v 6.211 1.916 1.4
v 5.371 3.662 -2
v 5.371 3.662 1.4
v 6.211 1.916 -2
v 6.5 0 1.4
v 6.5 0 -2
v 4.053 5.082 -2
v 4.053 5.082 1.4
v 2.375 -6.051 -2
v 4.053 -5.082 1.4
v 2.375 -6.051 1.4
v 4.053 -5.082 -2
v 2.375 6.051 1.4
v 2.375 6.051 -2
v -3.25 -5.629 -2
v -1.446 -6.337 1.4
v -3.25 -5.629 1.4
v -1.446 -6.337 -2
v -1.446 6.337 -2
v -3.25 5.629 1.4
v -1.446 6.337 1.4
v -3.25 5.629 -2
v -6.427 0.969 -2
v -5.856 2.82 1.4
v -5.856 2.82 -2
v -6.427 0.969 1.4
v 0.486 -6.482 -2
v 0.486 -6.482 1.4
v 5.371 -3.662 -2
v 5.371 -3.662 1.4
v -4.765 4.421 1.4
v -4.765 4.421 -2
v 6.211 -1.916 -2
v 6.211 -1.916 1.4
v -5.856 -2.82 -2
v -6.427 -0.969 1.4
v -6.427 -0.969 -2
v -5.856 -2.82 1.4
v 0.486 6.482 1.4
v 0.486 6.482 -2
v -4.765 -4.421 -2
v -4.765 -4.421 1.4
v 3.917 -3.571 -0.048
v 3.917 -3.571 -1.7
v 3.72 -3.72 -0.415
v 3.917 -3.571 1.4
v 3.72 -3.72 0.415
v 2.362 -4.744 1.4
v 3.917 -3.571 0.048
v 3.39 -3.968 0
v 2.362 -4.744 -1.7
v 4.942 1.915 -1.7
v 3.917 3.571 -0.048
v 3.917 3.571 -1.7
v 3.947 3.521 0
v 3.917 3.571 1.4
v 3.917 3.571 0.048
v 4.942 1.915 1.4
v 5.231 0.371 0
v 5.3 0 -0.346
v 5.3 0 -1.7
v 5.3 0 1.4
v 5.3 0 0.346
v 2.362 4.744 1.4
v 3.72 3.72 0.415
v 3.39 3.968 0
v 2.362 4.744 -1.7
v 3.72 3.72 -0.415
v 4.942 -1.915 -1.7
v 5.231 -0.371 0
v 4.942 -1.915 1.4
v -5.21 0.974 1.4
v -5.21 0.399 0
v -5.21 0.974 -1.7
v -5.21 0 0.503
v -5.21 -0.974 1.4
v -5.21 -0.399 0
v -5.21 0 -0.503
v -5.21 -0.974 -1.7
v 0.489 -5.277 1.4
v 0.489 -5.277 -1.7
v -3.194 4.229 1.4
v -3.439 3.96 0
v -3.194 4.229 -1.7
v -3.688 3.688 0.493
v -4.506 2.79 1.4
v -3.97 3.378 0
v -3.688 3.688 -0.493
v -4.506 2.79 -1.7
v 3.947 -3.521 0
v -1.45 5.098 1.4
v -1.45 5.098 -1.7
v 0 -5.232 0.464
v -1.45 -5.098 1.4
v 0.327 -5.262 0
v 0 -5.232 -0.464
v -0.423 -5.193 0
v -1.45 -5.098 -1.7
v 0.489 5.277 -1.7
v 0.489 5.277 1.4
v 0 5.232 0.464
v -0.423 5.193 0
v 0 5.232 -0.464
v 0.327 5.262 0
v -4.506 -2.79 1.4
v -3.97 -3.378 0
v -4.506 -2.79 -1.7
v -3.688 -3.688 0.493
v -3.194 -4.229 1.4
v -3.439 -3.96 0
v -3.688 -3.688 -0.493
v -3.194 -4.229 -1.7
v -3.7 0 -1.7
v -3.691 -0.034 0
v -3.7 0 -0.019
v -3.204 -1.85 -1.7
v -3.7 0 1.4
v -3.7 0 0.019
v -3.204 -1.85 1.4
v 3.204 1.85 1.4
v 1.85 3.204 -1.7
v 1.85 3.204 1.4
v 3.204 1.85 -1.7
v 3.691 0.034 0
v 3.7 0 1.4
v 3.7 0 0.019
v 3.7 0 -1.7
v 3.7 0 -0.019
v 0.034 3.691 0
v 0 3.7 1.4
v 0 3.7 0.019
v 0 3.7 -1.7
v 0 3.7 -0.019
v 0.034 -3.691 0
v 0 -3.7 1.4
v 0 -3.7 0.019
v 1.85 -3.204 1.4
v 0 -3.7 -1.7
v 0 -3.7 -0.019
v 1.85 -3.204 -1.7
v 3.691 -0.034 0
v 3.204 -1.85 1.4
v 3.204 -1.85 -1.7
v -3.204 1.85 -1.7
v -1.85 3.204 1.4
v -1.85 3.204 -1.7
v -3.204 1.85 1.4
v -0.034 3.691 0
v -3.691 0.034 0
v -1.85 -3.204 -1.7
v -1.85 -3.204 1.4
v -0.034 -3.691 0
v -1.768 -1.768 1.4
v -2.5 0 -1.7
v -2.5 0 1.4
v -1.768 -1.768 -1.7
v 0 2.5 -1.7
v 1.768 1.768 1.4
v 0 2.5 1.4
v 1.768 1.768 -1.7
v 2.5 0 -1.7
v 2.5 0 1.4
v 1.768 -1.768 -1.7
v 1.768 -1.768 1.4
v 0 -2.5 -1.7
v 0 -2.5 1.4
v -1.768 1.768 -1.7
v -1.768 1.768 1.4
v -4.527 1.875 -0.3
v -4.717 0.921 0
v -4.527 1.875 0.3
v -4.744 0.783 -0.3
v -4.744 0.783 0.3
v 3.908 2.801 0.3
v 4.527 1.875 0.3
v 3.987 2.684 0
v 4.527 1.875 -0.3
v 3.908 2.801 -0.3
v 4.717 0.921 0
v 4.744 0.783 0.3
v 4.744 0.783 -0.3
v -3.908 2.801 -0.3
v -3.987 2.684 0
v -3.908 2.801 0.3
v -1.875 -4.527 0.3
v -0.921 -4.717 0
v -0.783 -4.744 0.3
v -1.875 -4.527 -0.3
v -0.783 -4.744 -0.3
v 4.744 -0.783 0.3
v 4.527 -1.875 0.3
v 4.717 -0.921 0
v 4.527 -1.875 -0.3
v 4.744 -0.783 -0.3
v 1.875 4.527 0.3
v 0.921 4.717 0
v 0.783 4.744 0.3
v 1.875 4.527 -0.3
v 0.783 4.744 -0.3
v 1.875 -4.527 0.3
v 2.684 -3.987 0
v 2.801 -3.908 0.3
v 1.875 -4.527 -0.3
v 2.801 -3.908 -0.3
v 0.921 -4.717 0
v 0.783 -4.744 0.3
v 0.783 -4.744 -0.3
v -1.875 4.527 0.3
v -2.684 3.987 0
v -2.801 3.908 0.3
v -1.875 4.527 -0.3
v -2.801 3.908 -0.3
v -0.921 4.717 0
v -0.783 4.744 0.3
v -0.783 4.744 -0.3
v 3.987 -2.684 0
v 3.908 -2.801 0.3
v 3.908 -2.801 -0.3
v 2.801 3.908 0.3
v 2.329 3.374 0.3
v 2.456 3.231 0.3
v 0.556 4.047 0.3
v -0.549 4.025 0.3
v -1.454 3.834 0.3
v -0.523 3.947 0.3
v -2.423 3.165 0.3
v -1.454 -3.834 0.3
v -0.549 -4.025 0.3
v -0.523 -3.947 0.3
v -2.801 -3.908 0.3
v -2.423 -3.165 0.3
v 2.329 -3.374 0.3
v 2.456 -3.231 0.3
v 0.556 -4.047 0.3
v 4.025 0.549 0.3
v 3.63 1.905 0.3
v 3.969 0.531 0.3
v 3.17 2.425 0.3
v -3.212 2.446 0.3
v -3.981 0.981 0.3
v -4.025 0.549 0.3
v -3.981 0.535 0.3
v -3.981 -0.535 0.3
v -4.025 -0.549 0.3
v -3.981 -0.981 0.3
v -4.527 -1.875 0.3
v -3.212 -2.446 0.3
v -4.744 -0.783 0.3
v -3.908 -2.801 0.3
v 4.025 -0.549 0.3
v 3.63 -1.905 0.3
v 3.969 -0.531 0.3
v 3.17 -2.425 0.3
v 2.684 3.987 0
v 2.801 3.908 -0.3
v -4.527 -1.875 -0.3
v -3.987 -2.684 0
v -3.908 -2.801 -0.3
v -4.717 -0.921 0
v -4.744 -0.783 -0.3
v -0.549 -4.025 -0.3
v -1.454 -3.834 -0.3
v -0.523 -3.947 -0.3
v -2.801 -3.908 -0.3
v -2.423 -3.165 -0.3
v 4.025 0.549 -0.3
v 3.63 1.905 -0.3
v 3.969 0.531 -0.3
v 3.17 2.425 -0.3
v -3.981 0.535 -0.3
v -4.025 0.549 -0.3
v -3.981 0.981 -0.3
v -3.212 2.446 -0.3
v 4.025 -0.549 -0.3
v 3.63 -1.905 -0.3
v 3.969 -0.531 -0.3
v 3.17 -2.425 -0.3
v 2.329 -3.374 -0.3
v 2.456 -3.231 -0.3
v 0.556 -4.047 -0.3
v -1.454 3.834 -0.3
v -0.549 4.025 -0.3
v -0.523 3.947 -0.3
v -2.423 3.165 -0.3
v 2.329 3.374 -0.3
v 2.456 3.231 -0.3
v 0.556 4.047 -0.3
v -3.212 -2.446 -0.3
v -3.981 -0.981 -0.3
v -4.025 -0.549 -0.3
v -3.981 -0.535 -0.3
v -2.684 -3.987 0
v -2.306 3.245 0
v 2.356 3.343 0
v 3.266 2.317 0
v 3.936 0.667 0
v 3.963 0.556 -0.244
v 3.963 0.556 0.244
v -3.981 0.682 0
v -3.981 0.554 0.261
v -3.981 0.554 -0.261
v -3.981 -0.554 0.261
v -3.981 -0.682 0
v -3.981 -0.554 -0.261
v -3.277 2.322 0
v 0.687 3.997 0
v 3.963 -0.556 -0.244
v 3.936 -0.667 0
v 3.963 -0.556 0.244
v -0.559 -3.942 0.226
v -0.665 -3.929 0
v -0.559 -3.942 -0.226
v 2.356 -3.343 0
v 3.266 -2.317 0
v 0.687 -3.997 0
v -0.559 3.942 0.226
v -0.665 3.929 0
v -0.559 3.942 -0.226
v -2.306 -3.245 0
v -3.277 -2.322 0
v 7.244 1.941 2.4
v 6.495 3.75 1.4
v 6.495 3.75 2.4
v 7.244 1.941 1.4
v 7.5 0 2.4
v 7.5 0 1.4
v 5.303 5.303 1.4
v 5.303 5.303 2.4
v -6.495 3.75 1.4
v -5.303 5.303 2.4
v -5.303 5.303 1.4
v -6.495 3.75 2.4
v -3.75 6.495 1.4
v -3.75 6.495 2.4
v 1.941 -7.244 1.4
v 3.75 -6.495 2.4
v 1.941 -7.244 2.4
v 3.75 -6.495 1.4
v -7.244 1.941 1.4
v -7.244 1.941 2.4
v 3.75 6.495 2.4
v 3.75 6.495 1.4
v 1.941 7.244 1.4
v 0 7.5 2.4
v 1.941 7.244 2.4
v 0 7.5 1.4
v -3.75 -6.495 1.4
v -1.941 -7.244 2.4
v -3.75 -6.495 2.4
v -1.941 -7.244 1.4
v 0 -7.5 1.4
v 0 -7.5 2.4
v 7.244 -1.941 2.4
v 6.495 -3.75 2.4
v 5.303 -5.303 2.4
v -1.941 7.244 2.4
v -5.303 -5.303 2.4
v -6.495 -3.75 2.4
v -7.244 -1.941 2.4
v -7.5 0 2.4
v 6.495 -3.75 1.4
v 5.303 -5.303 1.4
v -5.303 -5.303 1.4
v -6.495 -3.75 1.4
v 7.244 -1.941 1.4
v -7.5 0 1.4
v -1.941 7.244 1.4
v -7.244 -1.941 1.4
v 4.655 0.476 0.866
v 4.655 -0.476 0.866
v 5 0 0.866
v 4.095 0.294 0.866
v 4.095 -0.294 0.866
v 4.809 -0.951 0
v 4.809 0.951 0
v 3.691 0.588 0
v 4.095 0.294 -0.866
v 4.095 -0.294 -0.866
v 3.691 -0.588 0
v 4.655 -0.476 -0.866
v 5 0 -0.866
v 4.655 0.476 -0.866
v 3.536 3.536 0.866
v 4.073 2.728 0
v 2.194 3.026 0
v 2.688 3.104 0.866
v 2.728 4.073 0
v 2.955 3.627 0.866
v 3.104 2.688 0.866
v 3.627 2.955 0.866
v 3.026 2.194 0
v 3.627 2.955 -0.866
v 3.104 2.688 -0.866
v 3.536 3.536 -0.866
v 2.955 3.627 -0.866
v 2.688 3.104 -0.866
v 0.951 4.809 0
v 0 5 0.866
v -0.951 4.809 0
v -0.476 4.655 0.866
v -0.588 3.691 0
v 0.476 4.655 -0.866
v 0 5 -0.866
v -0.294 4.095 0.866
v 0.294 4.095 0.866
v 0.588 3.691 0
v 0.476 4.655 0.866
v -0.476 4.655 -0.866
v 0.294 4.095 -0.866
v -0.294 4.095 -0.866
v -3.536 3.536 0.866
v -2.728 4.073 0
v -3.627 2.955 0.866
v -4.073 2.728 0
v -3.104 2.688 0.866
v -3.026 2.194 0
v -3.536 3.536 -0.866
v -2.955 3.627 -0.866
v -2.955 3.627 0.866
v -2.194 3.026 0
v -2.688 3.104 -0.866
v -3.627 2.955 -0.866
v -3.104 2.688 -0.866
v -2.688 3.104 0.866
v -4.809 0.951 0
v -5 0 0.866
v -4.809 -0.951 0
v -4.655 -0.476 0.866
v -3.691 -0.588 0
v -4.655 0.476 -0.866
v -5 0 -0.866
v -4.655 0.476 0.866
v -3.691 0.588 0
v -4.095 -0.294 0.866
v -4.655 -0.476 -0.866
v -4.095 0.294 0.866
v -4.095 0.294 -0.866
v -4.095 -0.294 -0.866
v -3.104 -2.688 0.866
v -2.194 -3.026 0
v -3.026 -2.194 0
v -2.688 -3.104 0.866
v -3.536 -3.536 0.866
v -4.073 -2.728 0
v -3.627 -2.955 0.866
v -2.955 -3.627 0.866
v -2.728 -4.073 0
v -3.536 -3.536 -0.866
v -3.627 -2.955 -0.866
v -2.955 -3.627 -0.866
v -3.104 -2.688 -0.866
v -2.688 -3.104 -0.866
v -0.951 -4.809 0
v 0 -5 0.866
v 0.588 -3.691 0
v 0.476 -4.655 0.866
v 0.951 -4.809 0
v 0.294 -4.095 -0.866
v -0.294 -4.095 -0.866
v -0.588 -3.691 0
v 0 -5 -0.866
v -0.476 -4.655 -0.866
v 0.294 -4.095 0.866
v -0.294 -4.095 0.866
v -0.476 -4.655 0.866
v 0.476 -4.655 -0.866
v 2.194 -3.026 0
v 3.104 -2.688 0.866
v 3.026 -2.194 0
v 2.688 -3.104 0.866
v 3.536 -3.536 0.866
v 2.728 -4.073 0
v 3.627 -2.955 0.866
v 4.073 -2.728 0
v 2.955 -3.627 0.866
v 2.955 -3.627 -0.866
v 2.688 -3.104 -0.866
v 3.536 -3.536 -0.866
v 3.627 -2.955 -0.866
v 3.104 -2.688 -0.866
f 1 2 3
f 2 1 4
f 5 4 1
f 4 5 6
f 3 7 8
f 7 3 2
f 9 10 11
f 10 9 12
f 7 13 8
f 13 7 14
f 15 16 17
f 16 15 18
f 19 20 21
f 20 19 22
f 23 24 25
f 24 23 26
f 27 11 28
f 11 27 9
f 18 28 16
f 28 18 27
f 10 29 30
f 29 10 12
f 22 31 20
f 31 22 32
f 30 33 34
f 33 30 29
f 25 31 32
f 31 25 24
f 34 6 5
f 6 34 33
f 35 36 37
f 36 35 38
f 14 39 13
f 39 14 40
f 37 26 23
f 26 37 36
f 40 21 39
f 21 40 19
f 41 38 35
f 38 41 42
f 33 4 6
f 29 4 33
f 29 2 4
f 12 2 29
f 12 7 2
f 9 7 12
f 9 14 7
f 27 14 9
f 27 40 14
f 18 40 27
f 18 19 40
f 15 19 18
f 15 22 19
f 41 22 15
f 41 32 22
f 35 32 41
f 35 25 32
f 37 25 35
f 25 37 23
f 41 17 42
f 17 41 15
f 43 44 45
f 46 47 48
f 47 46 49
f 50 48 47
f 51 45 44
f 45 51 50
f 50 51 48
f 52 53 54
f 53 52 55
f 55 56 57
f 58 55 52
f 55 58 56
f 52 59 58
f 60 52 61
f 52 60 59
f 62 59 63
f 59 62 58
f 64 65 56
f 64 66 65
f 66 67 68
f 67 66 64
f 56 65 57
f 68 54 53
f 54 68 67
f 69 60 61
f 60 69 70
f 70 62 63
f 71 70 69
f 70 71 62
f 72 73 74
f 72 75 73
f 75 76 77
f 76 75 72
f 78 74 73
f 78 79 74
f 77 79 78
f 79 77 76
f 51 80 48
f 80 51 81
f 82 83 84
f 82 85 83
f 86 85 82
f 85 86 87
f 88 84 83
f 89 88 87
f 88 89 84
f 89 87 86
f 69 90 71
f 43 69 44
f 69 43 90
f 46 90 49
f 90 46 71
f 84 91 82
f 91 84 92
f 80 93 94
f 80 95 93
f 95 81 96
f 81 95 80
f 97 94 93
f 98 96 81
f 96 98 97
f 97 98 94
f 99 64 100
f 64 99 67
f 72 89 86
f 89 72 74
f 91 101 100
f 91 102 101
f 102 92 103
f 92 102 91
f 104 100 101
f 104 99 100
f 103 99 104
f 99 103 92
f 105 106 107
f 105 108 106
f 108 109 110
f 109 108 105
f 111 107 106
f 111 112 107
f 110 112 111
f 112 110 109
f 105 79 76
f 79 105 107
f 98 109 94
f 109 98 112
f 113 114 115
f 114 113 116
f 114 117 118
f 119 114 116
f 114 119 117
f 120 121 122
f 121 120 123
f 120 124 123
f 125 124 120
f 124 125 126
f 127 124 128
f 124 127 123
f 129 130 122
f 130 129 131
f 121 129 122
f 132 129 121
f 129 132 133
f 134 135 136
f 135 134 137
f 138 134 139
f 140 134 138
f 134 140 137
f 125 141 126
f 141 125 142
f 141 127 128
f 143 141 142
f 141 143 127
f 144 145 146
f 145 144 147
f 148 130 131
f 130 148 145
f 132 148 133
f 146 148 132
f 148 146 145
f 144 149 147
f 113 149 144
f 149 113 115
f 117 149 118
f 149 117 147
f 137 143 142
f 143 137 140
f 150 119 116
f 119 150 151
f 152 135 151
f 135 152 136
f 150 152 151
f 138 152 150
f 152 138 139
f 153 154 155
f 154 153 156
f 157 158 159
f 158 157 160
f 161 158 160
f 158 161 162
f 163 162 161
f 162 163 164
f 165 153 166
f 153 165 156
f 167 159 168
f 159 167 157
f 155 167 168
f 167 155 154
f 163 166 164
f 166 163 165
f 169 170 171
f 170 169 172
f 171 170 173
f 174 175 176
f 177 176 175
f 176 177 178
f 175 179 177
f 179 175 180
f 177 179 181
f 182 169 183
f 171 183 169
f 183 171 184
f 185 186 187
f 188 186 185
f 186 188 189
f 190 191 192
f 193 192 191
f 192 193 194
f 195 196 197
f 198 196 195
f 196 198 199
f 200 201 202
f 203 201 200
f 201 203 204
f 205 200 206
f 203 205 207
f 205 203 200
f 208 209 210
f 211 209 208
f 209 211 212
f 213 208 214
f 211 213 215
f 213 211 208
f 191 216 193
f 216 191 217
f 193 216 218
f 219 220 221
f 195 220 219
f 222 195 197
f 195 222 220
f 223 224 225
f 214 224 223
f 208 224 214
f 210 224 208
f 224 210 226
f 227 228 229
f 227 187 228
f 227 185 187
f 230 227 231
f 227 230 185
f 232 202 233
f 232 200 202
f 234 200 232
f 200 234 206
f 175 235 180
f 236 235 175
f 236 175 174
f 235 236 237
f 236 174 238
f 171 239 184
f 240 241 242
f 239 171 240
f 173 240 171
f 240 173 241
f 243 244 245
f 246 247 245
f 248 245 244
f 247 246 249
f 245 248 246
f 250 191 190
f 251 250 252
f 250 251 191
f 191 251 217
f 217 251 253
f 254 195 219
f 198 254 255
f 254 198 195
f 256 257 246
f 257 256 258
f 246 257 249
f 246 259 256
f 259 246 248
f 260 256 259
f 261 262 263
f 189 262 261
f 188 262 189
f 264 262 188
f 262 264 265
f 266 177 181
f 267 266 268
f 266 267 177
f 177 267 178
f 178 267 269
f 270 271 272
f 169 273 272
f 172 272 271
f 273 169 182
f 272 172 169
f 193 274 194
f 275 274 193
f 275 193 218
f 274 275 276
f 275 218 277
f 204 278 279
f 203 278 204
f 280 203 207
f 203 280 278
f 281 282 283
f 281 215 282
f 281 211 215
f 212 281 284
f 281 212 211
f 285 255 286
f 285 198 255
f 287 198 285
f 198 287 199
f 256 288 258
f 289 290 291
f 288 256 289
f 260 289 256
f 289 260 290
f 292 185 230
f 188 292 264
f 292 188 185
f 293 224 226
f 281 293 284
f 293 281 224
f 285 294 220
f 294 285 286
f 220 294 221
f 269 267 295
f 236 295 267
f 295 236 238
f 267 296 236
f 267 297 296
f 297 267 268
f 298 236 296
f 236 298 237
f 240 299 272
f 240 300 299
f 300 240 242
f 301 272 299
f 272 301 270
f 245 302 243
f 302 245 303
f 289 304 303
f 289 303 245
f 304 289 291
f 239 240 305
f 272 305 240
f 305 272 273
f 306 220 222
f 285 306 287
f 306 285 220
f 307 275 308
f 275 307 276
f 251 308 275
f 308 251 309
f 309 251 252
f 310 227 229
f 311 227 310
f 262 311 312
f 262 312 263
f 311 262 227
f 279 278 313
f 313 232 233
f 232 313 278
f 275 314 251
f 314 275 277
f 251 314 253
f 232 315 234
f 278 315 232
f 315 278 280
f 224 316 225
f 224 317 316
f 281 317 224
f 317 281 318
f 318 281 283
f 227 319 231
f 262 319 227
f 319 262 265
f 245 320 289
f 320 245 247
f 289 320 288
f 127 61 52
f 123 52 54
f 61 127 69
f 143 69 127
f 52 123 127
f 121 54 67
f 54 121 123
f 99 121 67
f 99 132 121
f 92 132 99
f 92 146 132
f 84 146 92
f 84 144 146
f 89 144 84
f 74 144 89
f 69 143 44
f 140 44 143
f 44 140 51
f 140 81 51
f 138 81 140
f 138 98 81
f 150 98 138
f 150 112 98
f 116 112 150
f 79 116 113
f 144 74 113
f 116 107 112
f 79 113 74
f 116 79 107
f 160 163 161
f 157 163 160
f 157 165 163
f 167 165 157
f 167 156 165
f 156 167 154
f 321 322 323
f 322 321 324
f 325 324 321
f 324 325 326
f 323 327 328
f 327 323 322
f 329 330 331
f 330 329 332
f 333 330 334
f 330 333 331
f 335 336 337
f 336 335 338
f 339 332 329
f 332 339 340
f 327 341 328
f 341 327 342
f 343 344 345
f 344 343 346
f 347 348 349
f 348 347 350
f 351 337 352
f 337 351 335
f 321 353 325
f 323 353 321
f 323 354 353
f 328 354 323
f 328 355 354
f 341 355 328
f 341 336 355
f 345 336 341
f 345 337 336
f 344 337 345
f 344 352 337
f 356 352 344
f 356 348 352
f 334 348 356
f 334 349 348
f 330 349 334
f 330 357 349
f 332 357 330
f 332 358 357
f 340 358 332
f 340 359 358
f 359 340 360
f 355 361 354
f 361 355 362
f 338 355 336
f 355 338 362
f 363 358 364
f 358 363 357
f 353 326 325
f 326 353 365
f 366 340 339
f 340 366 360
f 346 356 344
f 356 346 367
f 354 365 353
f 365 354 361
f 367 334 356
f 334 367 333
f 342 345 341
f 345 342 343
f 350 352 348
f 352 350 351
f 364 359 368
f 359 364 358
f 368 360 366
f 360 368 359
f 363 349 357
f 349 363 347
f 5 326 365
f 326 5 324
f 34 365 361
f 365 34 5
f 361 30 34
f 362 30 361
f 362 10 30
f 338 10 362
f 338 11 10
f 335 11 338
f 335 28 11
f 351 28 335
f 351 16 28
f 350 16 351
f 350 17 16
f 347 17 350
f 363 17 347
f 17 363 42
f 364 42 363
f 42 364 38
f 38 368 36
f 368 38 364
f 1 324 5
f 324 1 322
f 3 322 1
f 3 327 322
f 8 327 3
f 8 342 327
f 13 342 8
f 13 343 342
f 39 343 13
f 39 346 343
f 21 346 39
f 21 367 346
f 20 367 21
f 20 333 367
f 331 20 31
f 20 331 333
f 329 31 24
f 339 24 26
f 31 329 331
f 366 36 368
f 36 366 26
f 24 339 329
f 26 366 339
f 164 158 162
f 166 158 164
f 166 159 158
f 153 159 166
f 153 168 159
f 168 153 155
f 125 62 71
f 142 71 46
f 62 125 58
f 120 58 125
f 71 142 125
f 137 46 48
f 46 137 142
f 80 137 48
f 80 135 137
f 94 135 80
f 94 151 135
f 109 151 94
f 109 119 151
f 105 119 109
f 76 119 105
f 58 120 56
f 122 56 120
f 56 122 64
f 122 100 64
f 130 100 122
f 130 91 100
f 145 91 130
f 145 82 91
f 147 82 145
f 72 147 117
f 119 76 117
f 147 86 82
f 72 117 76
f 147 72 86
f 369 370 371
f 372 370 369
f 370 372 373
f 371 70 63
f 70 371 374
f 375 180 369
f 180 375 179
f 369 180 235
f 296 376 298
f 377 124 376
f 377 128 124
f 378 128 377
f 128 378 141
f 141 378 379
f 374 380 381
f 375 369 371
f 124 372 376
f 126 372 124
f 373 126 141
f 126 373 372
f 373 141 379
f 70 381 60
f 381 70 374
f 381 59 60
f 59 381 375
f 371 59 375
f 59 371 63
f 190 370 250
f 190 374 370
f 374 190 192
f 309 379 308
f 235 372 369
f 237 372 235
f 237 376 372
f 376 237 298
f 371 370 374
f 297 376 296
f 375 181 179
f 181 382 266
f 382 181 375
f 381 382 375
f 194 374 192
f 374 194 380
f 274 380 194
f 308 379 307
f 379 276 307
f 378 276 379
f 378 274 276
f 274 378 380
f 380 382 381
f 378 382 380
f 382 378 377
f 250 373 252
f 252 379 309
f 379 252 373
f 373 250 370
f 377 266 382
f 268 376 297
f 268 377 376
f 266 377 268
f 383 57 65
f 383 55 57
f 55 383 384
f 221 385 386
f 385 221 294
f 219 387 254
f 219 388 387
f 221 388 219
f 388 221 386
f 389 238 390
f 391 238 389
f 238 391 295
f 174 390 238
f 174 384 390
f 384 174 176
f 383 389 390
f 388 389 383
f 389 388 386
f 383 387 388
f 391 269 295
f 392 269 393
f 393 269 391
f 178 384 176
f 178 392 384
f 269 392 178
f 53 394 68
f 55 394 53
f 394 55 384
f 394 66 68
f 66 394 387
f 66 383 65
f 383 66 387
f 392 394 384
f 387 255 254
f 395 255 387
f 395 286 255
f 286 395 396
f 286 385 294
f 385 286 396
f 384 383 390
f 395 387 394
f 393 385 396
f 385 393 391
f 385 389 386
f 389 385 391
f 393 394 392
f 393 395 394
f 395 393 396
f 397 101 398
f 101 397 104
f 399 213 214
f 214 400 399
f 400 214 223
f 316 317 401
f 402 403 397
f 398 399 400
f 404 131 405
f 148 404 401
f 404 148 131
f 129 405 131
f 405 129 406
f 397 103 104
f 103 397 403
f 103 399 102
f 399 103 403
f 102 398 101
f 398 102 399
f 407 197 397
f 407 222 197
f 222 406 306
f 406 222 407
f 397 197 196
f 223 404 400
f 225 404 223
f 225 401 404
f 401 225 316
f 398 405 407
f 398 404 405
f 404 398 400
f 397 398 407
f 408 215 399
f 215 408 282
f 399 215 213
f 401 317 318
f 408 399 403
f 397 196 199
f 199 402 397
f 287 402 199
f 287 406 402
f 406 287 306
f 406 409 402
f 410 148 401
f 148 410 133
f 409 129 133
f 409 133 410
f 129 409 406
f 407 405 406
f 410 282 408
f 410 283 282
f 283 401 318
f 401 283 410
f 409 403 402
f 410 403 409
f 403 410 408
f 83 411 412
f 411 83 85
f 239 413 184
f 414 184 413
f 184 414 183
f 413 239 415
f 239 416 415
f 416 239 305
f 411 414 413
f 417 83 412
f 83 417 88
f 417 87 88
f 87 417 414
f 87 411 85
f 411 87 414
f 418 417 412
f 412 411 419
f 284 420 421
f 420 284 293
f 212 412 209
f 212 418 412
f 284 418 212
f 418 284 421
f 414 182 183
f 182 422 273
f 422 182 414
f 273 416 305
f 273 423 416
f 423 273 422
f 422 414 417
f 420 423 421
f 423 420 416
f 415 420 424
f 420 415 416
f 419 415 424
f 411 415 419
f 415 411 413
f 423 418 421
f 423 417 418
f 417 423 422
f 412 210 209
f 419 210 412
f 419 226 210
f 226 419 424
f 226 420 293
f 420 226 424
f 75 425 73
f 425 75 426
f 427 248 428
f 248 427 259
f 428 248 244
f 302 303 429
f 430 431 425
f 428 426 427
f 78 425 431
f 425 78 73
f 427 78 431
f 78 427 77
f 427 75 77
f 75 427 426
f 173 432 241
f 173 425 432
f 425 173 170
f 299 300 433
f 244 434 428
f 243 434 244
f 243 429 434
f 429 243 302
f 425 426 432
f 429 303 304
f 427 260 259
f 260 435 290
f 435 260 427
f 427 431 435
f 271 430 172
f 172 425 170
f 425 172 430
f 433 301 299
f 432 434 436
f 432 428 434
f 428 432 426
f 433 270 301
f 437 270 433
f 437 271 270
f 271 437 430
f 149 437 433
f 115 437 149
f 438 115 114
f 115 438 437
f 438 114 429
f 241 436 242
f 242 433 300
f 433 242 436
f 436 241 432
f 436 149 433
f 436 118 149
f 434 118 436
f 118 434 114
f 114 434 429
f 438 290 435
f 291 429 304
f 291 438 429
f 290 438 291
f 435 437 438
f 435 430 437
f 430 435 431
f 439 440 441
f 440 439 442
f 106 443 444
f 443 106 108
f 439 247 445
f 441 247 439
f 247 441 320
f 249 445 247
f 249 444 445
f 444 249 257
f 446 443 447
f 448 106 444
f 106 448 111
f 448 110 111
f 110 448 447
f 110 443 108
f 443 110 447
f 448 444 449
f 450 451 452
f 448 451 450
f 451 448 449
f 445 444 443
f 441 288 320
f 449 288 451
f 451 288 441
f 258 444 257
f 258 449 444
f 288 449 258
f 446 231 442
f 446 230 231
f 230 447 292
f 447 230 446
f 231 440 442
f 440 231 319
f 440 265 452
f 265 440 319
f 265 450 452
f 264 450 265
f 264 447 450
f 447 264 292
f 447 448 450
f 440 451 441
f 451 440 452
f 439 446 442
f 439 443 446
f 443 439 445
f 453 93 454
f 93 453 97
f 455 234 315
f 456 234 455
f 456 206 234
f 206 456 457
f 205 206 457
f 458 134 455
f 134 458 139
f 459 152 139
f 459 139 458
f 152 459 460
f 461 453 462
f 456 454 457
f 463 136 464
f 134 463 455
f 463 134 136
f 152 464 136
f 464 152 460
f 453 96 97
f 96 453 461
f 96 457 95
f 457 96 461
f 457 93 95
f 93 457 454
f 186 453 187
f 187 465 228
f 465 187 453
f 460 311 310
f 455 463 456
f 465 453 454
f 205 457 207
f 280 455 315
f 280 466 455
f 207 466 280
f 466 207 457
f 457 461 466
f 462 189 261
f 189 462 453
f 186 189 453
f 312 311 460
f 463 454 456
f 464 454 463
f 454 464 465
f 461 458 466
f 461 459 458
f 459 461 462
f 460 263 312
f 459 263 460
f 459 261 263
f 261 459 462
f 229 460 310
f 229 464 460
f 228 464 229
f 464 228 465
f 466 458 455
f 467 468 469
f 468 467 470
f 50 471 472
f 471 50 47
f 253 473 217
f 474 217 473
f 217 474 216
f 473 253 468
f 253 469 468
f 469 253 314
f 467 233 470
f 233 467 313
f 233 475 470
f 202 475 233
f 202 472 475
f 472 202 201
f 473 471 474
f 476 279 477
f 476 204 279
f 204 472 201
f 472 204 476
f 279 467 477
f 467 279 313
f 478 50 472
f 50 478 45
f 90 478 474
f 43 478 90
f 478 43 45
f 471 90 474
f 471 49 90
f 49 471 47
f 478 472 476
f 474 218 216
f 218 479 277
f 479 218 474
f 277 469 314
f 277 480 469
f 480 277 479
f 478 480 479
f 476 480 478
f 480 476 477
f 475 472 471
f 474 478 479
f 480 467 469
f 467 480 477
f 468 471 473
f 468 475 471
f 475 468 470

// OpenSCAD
// Parameters
bore_diameter_mm = 5; //[2.5:10:0.1]
outer_diameter_mm = 13; //[6.5:26:0.1]
width_mm = 4; //[2:8:0.1]
flange_diameter_mm = 15; //[7.5:30:0.1]
flange_width_mm = 1; //[0.5:2:0.1]
rim_thickness_mm = 1.2; //[0.6:2.4:0.1]
hub_thickness_mm = 1.2; //[0.6:2.4:0.1]
chamfer_mm = 0.3; //[0.1:0.8:0.05]
eps_mm = 0.8; //[0.5:2:0.1]
shield_thickness_mm = 0.6; //[0.3:1.2:0.05]
shield_radial_gap_mm = 0.4; //[0.2:1:0.05]
ball_diameter_mm = 2; //[1:4:0.1]
ball_count = 8; //[6:14:1]

// Ball Bearing - complete geometry
module ball_bearing() {
  color("Silver") {
    // Outer Race
    difference() {
      cylinder(r=outer_diameter_mm/2, h=width_mm, center=true);
      cylinder(r=outer_diameter_mm/2 - rim_thickness_mm, h=width_mm + 2*eps_mm, center=true);
    }
    // Inner Race
    difference() {
      cylinder(r=bore_diameter_mm/2 + hub_thickness_mm, h=width_mm, center=true);
      cylinder(r=bore_diameter_mm/2, h=width_mm + 2*eps_mm, center=true);
    }
    // Flange
    translate([0, 0, width_mm/2 - flange_width_mm/2 + eps_mm/2])
      cylinder(r=flange_diameter_mm/2, h=flange_width_mm, center=true);
    // Shield
    difference() {
      cylinder(r=outer_diameter_mm/2 - rim_thickness_mm - shield_radial_gap_mm, h=shield_thickness_mm, center=true);
      cylinder(r=bore_diameter_mm/2 + hub_thickness_mm + shield_radial_gap_mm, h=shield_thickness_mm + 2*eps_mm, center=true);
    }
    // Chamfers
    union() {
      translate([0, 0, width_mm/2 - chamfer_mm/2])
        cylinder(r1=outer_diameter_mm/2, r2=outer_diameter_mm/2 - chamfer_mm, h=chamfer_mm, center=true);
      translate([0, 0, -width_mm/2 + chamfer_mm/2])
        cylinder(r1=outer_diameter_mm/2, r2=outer_diameter_mm/2 - chamfer_mm, h=chamfer_mm, center=true);
      translate([0, 0, width_mm/2 - chamfer_mm/2])
        cylinder(r1=bore_diameter_mm/2 + hub_thickness_mm, r2=bore_diameter_mm/2 + hub_thickness_mm - chamfer_mm, h=chamfer_mm, center=true);
      translate([0, 0, -width_mm/2 + chamfer_mm/2])
        cylinder(r1=bore_diameter_mm/2 + hub_thickness_mm, r2=bore_diameter_mm/2 + hub_thickness_mm - chamfer_mm, h=chamfer_mm, center=true);
    }
  }
}

// Bearing Ball - complete geometry
module bearing_ball() {
  color("Copper") {
    for (i = [0:ball_count-1]) {
      rotate([0, 0, i*360/ball_count])
        translate([(bore_diameter_mm/2 + hub_thickness_mm + outer_diameter_mm/2 - rim_thickness_mm)/2, 0, 0])
        sphere(r=ball_diameter_mm/2);
    }
  }
}

// Assembly
module assembly() {
  ball_bearing();
  bearing_ball();
}

assembly();
